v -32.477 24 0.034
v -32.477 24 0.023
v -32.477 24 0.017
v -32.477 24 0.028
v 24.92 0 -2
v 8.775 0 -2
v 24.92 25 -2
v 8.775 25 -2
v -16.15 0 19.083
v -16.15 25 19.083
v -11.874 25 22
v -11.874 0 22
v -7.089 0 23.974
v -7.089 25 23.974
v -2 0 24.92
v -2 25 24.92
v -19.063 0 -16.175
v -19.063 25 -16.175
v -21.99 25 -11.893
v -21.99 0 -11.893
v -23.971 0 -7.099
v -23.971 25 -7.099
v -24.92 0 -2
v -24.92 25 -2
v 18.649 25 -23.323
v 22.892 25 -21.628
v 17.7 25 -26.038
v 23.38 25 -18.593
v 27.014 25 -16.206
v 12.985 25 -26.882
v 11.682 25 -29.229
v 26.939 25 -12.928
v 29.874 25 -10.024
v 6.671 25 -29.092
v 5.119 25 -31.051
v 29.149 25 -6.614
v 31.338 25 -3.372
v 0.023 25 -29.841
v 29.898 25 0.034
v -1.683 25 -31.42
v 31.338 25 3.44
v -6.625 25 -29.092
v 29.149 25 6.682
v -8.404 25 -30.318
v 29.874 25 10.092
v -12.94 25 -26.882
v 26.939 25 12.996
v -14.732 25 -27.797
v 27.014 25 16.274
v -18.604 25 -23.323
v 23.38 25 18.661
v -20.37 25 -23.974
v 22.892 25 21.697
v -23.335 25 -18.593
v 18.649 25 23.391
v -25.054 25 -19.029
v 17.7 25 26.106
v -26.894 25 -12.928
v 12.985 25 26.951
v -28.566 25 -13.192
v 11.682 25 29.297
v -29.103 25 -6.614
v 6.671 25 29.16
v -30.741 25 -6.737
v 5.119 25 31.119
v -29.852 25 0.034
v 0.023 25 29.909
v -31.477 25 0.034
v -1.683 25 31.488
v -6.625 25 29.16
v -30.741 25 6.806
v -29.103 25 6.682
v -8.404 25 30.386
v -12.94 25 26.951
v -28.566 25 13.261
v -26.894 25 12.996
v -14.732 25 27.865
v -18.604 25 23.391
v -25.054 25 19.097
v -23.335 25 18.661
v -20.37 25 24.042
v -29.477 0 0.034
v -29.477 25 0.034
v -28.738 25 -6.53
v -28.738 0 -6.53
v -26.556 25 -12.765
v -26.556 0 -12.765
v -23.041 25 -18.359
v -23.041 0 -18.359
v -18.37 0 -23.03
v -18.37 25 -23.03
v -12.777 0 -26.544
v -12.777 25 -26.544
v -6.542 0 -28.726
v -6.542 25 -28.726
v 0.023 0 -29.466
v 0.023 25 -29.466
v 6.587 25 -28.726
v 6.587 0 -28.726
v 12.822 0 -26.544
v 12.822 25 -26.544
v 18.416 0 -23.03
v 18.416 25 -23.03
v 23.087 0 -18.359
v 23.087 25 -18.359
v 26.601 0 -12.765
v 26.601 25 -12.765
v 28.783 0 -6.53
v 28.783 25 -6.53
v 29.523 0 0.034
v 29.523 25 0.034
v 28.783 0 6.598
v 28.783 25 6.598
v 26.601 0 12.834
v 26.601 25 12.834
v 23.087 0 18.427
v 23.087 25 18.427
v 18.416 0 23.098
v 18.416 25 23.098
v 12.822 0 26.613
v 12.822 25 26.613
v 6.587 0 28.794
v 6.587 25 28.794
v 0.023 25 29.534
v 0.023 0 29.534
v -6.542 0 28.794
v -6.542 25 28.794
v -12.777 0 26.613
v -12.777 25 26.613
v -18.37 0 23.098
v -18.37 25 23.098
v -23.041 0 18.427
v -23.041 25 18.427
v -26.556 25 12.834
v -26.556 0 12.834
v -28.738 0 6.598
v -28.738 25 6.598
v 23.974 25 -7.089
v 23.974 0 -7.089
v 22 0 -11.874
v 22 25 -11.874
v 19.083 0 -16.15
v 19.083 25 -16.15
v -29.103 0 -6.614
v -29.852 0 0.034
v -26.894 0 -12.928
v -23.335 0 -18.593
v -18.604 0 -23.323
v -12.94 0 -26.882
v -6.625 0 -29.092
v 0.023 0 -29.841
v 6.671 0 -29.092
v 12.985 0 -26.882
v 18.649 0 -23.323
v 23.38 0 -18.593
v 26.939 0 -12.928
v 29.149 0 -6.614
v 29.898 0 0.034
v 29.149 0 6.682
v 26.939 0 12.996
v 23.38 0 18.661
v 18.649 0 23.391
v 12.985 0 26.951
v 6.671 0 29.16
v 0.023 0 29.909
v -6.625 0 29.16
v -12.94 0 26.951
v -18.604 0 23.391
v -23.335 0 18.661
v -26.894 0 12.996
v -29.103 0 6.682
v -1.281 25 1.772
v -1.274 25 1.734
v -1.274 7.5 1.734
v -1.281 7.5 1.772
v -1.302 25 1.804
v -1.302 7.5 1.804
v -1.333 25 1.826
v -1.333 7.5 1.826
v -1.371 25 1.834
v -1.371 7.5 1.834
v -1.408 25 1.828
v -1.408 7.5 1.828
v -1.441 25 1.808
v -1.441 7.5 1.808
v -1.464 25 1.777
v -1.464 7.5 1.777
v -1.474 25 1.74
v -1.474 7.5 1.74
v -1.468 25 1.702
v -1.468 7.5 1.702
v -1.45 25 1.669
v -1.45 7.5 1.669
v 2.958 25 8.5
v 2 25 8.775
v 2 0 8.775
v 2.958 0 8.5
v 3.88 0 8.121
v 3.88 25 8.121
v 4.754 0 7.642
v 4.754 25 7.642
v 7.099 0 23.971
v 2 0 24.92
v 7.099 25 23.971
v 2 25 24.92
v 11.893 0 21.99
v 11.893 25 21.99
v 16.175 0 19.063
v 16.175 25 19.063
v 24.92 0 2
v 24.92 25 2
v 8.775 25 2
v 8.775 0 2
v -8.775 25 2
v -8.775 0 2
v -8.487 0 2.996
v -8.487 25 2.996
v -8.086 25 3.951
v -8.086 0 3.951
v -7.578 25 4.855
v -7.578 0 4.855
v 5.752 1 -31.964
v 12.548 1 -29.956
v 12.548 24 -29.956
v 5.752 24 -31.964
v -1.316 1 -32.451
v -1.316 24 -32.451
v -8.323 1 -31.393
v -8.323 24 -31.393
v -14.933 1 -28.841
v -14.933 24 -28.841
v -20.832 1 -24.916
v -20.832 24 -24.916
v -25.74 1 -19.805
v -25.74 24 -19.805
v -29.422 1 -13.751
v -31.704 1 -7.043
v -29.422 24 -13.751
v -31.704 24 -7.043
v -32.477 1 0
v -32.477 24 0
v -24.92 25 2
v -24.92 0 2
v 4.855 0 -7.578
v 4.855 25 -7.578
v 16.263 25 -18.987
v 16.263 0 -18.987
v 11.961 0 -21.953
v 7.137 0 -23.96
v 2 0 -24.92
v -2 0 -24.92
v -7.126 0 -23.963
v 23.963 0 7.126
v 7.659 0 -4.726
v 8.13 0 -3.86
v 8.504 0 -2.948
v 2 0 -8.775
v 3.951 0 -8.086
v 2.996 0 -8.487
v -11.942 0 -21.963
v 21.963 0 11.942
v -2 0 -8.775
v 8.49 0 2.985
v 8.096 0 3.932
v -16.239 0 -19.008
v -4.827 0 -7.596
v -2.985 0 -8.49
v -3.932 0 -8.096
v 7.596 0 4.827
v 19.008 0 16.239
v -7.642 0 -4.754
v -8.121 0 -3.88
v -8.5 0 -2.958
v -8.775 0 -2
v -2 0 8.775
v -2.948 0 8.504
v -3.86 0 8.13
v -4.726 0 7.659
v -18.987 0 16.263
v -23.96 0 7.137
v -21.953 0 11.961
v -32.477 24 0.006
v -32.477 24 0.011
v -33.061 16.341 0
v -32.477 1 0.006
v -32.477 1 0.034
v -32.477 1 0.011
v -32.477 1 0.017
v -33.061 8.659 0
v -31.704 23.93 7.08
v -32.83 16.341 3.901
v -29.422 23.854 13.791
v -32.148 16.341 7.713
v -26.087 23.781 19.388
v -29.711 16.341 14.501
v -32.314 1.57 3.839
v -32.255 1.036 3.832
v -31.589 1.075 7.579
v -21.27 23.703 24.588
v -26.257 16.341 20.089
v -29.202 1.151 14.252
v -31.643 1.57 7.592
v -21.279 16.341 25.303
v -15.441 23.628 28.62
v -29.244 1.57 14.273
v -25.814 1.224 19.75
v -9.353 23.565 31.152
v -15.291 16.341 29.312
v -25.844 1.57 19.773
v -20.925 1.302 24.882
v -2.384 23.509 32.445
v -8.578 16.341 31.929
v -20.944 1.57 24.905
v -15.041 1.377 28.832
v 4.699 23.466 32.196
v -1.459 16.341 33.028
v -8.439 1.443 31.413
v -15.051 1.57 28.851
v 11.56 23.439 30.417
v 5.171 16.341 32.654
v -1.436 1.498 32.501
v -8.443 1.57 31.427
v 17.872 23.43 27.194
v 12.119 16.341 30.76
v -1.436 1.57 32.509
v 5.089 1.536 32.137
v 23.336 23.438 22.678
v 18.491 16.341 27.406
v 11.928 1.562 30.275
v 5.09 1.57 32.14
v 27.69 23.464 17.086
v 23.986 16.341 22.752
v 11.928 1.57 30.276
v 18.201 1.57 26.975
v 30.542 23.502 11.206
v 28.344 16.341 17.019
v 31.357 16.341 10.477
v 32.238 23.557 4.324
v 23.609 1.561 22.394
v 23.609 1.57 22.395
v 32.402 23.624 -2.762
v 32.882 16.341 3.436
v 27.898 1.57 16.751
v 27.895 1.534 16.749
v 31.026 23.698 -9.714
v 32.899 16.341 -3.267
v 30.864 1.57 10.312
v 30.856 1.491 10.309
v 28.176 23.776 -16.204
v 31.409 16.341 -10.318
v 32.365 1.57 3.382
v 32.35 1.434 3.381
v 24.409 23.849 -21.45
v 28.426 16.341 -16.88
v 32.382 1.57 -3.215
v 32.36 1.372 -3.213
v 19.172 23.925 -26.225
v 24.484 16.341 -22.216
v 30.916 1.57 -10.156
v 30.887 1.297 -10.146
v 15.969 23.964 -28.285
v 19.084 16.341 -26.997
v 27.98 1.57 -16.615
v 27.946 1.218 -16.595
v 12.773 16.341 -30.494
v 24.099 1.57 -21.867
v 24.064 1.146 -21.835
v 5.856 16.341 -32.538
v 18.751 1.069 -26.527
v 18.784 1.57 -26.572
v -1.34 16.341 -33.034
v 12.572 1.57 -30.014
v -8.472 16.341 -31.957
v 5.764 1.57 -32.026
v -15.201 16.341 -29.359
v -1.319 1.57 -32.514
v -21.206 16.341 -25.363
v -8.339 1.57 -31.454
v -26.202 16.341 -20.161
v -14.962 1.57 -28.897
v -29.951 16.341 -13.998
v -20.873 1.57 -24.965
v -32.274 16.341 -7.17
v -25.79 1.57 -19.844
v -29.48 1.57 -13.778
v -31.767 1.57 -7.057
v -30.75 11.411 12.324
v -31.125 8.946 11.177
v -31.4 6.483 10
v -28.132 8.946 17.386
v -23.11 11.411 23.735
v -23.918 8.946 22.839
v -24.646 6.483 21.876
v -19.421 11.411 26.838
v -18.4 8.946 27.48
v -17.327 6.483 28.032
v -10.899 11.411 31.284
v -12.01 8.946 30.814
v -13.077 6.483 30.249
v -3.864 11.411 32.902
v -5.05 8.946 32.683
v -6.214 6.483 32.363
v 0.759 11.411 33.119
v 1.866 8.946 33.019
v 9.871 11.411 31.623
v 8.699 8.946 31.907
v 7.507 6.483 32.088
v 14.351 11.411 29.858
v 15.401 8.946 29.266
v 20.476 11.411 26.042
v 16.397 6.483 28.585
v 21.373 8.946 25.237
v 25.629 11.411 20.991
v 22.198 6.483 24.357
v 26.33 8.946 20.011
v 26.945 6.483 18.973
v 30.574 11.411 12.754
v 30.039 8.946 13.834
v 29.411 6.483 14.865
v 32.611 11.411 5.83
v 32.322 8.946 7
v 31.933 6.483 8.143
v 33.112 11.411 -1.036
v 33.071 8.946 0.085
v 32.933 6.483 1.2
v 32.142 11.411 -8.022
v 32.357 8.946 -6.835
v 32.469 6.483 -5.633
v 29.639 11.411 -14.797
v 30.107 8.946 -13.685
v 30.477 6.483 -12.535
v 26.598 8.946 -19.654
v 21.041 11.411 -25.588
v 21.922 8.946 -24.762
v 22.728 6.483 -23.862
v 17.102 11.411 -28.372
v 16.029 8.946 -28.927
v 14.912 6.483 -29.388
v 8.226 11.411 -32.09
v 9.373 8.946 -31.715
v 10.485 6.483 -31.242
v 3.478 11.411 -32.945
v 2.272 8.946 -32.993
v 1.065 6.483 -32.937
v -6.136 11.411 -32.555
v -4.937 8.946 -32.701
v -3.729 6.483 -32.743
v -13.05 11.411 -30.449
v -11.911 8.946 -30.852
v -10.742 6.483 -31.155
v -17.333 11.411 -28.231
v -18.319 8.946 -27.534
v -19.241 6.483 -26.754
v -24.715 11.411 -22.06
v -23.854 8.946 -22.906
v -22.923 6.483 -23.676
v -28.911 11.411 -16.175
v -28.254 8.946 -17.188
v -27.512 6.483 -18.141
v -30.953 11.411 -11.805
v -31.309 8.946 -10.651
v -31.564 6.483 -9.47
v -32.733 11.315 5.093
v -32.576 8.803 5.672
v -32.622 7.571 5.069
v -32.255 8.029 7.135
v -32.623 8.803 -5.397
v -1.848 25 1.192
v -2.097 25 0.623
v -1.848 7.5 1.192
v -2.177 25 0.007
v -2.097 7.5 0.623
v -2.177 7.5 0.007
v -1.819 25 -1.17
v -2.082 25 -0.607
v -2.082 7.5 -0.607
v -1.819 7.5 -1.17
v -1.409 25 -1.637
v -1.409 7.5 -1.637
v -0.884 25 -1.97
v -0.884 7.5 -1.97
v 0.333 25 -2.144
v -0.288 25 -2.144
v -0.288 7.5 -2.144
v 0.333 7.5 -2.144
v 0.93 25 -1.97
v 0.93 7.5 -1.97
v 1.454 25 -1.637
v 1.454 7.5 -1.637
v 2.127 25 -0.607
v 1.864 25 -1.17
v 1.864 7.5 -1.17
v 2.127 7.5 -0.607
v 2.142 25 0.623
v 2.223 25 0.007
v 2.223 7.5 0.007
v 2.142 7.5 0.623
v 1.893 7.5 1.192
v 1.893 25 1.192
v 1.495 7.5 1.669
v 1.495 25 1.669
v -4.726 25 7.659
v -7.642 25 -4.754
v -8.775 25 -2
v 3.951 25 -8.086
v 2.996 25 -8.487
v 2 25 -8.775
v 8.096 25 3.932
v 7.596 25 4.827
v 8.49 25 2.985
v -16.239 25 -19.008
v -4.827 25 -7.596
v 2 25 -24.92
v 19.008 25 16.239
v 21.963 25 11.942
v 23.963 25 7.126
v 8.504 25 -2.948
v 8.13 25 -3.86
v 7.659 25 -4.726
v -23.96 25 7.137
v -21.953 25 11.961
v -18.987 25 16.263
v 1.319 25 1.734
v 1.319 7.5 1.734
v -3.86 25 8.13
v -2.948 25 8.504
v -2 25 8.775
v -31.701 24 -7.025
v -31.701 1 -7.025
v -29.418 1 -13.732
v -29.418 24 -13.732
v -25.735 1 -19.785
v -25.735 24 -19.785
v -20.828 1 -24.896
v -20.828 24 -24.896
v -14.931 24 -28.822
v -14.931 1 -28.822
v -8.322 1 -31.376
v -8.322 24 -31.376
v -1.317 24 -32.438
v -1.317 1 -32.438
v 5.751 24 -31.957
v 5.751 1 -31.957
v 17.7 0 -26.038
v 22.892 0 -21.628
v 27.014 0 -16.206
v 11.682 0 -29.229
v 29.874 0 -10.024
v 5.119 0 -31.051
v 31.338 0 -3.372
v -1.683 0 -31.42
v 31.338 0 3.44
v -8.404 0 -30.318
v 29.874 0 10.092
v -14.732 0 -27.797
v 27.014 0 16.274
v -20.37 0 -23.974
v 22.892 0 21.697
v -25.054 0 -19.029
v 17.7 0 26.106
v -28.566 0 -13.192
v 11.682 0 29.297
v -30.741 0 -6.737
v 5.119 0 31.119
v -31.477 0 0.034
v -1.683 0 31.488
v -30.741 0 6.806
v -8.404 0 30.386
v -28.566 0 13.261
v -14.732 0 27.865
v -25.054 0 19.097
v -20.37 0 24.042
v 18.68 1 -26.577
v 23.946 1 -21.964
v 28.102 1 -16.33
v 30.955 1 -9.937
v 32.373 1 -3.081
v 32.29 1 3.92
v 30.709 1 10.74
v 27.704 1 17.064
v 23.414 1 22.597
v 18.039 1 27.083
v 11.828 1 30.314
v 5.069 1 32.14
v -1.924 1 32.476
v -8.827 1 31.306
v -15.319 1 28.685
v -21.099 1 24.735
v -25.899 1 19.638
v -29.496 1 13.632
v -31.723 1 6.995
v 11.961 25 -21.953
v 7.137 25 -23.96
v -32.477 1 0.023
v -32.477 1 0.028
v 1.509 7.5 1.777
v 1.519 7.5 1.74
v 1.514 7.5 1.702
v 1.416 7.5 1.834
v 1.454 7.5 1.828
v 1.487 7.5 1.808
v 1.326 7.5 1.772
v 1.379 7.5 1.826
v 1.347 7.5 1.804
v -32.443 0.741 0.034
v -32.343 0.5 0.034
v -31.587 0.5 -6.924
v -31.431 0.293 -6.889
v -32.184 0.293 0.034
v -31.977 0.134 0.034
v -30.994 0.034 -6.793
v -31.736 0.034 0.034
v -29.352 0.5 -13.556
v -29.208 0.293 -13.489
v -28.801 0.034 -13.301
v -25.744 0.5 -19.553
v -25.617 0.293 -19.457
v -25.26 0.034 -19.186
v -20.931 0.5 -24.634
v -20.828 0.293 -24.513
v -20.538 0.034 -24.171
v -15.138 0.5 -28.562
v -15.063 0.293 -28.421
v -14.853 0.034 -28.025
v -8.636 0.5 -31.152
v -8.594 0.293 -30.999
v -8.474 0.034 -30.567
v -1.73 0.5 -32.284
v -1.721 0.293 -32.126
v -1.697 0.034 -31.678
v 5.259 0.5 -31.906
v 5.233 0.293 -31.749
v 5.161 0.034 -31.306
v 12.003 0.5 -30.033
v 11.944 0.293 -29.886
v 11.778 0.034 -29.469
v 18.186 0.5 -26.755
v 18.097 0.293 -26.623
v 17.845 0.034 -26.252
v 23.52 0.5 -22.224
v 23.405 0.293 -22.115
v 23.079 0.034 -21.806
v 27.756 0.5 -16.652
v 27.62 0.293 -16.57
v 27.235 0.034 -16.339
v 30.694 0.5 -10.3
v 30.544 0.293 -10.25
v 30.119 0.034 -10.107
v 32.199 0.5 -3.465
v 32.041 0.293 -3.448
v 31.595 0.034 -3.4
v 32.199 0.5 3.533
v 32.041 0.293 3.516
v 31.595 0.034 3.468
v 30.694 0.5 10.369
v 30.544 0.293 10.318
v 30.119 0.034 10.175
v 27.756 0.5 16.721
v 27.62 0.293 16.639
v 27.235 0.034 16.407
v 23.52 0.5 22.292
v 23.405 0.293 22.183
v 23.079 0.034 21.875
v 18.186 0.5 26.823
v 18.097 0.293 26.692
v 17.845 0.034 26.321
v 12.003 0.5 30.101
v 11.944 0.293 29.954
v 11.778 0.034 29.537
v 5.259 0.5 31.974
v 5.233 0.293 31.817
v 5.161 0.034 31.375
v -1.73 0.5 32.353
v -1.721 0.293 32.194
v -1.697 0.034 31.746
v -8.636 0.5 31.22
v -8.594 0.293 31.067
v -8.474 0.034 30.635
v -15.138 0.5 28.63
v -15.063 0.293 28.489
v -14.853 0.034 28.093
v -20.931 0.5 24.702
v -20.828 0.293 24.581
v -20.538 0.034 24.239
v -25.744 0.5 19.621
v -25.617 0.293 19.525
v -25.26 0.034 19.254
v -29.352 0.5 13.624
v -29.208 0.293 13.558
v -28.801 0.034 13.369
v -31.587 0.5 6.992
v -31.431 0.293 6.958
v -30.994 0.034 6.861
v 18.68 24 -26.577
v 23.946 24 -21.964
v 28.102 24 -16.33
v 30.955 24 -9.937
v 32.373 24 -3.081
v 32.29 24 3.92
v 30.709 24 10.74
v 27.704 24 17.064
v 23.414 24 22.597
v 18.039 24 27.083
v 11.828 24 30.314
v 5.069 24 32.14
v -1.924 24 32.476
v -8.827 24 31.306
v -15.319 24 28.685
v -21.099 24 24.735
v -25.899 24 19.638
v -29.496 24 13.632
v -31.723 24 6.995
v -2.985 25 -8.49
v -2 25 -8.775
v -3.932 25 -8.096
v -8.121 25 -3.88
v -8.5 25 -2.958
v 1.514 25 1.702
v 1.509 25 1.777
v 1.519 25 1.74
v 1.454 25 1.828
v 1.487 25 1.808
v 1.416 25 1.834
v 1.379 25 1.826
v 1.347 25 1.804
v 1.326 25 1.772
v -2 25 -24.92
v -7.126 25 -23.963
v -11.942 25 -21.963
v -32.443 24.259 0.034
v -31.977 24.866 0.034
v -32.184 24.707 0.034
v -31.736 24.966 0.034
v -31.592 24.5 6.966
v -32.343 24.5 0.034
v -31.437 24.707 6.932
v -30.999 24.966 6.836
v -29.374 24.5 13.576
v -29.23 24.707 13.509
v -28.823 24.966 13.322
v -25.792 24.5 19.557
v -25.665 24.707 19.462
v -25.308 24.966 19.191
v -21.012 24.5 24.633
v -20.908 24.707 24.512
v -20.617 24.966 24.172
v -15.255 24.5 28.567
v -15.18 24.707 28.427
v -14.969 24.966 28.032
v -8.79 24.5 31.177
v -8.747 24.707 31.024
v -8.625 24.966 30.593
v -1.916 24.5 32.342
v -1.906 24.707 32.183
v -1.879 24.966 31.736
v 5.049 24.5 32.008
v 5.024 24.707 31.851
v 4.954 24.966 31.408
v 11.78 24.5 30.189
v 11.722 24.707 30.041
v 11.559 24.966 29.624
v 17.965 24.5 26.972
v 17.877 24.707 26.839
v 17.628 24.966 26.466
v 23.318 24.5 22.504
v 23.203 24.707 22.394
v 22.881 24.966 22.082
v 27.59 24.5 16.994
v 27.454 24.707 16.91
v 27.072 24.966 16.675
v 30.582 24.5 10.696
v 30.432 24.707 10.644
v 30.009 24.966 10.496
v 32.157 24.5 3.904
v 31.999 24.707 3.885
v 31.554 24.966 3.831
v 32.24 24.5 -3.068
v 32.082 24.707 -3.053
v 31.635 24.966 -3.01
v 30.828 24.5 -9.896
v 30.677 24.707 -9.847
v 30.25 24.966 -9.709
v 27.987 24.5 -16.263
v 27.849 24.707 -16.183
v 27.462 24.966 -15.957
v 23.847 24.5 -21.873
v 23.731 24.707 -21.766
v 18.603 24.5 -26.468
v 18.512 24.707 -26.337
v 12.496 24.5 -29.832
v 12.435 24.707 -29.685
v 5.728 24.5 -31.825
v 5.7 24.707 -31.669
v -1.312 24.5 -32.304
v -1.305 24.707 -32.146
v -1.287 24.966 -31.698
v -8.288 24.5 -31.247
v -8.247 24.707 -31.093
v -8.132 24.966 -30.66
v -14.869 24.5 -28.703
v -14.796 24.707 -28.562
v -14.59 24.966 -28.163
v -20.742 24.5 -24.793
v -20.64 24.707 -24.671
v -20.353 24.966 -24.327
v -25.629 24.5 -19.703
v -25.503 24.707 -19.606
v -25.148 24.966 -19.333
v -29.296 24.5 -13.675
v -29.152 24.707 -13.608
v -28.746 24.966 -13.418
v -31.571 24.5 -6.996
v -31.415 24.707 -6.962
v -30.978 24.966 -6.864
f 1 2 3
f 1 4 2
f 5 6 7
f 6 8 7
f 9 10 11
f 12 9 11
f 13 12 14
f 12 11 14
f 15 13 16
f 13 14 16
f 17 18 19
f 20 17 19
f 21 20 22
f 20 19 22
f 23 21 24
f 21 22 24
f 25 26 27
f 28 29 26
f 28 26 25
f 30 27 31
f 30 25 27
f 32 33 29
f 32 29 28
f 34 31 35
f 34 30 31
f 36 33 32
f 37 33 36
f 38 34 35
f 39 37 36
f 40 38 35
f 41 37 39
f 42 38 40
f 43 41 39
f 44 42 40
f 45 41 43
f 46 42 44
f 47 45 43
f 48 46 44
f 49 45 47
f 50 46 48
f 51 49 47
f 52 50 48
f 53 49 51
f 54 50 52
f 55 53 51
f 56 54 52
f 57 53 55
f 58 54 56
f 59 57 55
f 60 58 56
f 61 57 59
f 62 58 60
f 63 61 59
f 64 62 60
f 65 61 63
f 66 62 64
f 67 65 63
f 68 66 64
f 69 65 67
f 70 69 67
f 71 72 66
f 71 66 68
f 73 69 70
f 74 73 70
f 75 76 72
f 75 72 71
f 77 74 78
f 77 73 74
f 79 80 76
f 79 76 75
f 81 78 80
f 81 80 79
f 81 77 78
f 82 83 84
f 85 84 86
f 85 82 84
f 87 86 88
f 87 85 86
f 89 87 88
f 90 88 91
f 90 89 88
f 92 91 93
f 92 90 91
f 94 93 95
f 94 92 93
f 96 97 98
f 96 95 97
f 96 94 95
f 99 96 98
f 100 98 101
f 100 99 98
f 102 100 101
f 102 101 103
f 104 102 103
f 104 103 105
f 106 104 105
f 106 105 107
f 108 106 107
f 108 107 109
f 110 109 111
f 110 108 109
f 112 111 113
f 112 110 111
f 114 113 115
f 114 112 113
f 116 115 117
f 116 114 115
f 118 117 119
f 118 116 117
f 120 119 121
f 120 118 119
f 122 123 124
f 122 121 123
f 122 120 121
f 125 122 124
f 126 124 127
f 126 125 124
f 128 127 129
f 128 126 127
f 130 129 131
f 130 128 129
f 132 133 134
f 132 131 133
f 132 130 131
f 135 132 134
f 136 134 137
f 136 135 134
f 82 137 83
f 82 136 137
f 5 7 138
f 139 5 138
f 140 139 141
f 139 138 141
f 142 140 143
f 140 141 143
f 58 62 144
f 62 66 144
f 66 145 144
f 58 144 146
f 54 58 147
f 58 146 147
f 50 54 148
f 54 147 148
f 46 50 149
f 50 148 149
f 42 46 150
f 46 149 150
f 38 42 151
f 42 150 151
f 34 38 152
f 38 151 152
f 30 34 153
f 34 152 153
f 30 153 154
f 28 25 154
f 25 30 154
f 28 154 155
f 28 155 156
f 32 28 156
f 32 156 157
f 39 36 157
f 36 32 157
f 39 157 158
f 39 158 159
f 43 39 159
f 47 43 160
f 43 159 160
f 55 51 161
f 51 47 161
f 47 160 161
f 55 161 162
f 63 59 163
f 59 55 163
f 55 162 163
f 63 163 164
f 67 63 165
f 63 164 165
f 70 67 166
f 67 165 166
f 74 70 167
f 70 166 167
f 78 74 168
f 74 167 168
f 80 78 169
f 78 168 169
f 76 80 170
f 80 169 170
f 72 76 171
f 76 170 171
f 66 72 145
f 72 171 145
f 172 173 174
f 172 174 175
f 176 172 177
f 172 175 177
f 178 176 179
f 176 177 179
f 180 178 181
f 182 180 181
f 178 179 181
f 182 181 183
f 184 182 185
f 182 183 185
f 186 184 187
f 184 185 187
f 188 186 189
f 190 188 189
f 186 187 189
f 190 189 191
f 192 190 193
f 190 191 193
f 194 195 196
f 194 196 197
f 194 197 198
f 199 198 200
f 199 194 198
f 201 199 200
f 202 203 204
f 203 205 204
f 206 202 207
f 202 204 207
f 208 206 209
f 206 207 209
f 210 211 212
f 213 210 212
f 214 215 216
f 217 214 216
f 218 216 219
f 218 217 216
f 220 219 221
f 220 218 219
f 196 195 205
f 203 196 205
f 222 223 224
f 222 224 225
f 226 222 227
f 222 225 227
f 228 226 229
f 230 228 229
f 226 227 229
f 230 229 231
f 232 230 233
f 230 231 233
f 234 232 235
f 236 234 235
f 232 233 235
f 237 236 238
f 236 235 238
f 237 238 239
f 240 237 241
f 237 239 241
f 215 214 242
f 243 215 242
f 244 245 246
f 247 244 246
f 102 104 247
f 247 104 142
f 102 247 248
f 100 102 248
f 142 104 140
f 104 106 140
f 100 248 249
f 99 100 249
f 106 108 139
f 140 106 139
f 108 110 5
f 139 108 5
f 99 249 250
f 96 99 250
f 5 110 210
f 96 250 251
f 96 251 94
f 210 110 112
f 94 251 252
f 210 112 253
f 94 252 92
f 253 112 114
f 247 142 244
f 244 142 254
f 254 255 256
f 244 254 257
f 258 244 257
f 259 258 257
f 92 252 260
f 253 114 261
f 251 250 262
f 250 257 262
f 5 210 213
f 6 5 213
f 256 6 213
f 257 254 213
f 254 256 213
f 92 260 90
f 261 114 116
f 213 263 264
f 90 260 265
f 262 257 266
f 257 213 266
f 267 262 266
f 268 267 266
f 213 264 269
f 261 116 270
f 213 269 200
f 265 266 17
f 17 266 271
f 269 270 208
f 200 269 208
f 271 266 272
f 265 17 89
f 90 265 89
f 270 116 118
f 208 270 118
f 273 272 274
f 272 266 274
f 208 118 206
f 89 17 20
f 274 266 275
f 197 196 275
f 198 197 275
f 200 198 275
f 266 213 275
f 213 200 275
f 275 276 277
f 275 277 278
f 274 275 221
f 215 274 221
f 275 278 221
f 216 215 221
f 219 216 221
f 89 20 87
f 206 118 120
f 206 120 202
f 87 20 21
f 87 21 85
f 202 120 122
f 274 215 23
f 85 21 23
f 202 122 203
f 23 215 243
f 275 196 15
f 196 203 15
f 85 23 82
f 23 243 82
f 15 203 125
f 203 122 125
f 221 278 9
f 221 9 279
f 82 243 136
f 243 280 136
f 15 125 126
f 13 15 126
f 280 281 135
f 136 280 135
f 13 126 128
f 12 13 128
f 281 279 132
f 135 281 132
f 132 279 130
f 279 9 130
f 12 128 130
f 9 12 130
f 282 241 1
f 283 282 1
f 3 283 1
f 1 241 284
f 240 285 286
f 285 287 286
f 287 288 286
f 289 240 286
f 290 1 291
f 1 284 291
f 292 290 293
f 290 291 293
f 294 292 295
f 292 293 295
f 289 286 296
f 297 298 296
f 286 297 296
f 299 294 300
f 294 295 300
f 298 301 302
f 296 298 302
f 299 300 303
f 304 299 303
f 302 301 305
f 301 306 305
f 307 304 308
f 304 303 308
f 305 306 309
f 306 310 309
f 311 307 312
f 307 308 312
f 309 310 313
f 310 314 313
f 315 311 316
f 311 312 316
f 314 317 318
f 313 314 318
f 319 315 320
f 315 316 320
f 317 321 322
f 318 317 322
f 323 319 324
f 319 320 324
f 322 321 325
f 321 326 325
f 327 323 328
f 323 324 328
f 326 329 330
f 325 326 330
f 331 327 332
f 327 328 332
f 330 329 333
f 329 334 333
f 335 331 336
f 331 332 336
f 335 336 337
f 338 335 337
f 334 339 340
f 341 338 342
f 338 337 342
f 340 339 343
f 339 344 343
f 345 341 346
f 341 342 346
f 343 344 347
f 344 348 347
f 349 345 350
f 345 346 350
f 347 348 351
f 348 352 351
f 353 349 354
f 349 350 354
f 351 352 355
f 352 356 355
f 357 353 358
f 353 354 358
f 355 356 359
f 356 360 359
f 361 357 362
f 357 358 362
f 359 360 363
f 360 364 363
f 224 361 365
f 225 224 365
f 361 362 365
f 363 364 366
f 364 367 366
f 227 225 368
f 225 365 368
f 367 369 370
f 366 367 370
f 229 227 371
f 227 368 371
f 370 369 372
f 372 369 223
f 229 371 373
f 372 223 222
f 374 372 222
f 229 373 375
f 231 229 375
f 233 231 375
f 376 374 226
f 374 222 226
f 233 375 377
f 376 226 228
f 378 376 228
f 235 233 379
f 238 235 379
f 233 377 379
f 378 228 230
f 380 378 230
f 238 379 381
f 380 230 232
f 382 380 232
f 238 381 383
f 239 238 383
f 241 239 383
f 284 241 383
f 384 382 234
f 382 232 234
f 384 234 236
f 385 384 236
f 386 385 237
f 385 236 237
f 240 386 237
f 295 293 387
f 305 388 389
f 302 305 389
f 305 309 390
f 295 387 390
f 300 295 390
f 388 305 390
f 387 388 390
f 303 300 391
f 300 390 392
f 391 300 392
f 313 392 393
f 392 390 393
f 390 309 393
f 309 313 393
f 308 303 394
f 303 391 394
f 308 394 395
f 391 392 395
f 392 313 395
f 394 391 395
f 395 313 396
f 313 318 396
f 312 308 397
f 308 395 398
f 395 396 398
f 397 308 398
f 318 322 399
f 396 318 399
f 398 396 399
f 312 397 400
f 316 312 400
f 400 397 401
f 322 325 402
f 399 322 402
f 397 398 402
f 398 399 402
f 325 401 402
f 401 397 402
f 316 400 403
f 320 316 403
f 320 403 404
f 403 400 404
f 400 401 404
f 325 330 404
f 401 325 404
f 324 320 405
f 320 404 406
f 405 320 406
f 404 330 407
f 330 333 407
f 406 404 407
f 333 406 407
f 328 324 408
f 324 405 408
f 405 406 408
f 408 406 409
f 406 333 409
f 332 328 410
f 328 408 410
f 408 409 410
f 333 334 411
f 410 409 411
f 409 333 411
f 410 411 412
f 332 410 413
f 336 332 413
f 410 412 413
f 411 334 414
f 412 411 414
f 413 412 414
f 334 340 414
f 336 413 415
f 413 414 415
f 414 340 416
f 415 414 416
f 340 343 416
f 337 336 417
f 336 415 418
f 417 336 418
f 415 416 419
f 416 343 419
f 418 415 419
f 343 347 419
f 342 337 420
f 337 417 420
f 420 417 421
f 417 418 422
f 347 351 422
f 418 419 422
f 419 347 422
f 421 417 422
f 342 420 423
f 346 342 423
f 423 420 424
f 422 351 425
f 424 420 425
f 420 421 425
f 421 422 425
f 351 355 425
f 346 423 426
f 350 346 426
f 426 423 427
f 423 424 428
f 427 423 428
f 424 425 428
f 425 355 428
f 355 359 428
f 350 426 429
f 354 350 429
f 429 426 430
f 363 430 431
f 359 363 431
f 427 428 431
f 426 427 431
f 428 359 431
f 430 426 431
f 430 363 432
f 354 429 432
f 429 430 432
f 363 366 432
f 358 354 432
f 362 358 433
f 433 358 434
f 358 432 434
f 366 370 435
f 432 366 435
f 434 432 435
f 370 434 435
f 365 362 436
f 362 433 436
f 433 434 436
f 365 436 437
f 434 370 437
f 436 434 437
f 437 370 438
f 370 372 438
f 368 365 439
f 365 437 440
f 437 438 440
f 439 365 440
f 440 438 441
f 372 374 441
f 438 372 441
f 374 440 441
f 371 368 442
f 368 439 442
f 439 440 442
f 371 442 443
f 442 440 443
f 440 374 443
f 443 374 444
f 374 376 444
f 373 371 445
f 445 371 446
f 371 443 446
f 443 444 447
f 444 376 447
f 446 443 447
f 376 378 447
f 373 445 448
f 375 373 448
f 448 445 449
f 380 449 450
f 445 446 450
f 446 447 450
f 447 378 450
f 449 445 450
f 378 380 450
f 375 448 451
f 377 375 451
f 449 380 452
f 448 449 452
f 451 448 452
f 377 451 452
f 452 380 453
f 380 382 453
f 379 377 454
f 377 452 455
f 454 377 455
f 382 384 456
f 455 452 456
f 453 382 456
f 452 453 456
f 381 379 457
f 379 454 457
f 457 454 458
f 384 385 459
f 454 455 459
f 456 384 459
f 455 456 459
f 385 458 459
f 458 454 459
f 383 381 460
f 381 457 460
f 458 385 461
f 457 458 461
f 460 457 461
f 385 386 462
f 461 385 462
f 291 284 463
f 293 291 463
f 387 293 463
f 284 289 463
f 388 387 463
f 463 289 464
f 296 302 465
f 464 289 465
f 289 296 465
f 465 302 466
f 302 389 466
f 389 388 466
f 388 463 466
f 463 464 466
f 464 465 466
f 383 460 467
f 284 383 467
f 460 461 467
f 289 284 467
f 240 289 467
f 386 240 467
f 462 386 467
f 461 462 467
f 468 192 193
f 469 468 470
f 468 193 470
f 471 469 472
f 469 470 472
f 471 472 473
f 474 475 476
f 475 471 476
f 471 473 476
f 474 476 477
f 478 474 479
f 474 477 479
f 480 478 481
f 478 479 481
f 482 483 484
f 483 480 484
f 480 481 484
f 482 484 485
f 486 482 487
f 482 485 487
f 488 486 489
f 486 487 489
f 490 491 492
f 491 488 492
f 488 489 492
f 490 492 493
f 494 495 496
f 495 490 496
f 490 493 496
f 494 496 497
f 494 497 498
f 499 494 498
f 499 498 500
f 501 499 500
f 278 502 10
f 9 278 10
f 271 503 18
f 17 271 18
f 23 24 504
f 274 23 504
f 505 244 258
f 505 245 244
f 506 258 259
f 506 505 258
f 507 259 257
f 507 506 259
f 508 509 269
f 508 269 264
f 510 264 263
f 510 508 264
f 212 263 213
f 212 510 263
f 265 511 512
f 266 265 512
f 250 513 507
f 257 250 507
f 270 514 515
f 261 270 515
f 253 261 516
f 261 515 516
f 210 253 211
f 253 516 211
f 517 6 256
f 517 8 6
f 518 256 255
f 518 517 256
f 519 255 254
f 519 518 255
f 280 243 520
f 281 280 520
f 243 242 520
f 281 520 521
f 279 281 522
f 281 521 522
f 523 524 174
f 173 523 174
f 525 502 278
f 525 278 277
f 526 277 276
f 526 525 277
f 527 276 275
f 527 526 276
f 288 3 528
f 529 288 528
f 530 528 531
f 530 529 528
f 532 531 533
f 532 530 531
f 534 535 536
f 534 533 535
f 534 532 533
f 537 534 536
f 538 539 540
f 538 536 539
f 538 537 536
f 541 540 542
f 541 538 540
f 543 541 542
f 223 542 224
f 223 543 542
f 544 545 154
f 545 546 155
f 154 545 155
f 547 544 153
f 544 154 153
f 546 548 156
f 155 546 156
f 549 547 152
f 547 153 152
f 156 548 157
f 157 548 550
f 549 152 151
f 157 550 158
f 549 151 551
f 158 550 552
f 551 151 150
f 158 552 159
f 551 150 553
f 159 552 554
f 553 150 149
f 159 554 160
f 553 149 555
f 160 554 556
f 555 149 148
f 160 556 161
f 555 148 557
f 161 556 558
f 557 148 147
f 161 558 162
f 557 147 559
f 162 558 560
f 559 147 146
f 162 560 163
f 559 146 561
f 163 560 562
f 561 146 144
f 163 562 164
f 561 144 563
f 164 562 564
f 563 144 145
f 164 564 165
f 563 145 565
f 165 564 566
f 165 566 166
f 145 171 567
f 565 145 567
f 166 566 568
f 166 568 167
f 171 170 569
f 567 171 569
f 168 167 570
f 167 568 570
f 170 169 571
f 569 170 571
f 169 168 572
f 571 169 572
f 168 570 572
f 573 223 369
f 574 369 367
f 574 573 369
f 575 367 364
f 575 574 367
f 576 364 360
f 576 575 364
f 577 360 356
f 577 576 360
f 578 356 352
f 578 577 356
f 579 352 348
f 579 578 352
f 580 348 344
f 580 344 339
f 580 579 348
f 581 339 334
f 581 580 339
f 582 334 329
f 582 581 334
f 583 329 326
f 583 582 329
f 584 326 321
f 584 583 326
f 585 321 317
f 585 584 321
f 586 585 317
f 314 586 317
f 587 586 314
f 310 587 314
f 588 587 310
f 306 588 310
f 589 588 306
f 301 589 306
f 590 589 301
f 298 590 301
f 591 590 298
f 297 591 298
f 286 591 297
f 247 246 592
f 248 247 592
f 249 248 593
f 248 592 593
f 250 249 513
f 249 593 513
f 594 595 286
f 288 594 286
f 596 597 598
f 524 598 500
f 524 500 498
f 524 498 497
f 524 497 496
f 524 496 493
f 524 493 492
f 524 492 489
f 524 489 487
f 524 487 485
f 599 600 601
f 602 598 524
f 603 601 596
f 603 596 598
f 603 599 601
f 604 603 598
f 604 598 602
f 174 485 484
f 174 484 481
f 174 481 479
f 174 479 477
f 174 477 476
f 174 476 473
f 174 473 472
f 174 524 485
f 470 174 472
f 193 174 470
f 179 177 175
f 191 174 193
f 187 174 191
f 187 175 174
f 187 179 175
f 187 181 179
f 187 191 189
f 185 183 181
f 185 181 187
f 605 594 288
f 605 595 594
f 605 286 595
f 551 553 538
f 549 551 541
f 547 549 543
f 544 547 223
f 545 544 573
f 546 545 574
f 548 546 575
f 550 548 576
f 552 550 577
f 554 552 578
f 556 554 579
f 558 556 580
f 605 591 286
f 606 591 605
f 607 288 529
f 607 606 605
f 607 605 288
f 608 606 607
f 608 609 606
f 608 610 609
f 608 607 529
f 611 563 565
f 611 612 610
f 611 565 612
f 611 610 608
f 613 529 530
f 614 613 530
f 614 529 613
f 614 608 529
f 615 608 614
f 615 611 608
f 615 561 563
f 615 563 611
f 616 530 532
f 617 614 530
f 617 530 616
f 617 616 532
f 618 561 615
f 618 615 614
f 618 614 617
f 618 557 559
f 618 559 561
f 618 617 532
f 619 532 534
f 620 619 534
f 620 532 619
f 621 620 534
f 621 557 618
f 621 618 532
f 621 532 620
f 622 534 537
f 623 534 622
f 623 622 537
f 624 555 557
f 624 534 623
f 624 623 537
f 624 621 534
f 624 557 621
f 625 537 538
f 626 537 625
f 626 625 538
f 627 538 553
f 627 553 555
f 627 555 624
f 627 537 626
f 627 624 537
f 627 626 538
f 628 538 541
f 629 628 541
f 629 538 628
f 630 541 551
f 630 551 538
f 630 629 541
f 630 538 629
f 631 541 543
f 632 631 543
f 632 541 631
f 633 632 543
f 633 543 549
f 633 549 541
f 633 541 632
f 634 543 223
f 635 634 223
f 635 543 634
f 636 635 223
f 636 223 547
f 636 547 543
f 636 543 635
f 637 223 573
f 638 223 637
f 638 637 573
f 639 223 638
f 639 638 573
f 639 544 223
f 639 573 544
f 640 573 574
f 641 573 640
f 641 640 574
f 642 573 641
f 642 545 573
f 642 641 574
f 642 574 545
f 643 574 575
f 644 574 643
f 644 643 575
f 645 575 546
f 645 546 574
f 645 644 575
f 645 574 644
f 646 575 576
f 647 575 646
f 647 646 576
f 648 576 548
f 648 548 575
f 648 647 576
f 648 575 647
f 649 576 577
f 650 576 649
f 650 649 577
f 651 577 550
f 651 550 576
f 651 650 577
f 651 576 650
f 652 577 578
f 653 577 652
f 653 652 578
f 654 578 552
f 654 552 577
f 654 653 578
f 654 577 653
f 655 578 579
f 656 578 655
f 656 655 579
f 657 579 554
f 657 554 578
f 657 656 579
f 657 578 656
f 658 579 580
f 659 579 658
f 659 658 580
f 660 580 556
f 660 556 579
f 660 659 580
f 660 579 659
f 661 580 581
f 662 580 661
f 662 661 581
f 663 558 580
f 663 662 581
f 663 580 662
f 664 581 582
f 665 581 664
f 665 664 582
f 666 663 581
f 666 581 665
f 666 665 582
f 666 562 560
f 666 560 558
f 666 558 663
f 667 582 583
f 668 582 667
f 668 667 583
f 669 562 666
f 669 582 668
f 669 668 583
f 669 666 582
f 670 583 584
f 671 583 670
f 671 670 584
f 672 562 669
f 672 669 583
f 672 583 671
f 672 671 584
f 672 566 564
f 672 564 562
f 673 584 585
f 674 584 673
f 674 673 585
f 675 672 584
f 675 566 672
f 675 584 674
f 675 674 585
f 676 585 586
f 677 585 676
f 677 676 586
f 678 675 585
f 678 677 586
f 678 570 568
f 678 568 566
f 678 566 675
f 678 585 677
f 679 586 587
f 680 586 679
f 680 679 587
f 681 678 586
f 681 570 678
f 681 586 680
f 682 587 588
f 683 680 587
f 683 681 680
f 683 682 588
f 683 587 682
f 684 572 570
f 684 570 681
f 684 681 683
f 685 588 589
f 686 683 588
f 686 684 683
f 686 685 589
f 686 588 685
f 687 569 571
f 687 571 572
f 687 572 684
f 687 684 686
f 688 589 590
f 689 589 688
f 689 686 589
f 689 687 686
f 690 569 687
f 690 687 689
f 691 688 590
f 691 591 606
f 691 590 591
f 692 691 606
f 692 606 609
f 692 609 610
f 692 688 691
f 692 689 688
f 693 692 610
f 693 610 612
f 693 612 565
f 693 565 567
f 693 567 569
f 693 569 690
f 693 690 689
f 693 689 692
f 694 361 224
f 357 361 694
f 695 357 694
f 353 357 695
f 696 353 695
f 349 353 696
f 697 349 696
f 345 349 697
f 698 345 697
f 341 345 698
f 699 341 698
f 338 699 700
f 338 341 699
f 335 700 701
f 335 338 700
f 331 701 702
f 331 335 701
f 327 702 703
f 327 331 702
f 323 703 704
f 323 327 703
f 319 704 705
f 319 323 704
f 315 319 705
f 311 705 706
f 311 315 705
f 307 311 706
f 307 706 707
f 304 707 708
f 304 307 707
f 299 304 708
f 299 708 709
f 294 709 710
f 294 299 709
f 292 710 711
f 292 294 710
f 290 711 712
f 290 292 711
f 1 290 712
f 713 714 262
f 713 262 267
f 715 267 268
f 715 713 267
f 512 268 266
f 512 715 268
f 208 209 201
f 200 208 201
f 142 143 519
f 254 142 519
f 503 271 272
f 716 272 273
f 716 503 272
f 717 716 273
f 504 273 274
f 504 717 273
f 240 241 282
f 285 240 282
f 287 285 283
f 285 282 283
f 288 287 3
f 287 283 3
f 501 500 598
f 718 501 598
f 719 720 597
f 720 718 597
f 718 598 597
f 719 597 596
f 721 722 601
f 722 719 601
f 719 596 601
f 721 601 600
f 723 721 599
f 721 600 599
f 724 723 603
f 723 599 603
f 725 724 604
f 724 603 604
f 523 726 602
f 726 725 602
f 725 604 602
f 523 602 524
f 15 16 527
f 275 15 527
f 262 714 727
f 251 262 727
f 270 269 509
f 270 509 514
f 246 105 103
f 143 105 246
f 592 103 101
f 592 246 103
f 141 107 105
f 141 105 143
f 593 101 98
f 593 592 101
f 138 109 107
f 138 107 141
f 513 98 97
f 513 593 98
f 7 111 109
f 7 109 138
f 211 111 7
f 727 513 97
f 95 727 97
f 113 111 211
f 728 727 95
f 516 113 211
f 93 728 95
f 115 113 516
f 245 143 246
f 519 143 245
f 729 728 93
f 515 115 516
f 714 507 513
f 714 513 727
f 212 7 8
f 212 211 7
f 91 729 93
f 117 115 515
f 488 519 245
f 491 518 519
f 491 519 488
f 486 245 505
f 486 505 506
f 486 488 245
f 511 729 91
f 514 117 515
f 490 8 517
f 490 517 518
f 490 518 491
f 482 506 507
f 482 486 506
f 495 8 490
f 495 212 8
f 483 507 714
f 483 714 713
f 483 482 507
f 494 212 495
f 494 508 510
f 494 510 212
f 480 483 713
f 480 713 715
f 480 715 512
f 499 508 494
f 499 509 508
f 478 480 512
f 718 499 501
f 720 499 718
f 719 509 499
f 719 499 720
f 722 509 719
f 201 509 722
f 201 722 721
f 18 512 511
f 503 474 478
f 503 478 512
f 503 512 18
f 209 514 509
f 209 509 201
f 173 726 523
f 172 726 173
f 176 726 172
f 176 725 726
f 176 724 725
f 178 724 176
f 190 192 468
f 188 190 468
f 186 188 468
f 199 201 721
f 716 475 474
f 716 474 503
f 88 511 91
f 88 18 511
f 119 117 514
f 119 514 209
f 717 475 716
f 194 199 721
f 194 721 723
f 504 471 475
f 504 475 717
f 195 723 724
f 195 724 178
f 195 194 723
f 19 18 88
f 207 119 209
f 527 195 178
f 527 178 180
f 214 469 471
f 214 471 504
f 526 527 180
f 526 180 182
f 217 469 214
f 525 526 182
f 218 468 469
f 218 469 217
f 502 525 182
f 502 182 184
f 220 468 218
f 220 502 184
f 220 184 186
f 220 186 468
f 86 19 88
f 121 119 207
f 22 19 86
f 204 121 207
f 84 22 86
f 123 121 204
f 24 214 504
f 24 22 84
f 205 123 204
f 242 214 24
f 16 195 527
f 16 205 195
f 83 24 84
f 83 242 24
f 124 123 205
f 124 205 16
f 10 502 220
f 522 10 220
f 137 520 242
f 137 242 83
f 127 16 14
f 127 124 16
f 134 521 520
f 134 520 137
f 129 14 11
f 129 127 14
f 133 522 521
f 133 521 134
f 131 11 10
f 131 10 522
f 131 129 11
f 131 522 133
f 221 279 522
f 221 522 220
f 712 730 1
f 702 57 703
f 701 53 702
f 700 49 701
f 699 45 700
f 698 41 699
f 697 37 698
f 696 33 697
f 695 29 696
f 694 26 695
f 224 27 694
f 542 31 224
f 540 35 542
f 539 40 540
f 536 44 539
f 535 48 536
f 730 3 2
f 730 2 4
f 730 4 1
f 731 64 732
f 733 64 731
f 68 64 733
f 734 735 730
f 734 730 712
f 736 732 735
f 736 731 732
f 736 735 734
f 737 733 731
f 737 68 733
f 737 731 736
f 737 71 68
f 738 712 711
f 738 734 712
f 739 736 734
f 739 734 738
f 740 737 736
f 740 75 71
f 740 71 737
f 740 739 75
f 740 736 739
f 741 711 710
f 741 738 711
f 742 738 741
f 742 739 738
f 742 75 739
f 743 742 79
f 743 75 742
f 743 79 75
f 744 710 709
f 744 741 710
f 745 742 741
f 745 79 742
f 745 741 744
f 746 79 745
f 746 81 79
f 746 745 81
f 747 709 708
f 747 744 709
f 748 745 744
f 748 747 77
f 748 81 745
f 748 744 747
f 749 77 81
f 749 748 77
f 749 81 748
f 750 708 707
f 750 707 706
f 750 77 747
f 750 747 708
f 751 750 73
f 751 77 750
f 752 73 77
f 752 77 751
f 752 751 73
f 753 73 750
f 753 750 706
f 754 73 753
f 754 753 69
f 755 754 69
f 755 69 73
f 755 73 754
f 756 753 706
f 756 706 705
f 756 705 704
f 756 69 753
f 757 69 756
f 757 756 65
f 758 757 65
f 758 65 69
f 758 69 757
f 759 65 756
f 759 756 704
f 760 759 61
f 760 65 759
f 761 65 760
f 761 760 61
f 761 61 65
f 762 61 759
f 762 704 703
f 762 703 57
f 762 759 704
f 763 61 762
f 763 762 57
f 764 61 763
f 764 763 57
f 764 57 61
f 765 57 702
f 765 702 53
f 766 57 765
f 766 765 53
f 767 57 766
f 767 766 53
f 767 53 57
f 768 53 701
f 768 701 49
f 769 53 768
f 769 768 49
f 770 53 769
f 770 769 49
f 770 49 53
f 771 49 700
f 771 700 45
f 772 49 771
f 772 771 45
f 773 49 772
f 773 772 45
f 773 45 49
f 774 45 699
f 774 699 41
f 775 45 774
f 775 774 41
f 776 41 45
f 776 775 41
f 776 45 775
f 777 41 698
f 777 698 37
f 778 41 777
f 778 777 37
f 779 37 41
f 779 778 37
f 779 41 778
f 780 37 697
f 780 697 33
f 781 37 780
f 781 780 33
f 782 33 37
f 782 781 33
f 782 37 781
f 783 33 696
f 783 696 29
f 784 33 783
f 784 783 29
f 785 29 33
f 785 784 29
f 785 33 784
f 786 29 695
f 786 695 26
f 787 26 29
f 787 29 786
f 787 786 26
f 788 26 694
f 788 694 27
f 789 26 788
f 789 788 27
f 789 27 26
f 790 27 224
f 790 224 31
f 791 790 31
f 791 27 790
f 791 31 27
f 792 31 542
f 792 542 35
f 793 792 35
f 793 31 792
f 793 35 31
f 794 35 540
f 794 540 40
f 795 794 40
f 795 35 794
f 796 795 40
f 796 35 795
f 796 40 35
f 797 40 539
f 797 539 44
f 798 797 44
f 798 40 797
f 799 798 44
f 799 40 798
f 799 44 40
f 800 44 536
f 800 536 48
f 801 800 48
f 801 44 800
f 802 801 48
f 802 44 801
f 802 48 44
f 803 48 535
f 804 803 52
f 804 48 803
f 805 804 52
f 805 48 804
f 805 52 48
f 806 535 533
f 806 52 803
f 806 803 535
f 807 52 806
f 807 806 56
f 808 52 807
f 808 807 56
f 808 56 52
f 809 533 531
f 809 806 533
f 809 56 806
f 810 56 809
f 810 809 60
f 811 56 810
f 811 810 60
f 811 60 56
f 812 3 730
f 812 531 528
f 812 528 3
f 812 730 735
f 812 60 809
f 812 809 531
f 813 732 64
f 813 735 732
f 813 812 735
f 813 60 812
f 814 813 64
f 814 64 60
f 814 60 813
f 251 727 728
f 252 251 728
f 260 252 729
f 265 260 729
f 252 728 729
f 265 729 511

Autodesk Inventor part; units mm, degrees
ref_plane "YZ Plane" through (0, 0, 0) normal (1, 0, 0) x (0, 1, 0)
ref_plane "XZ Plane" through (0, 0, 0) normal (0, 1, 0) x (-1, 0, 0)
sketch "Sketch1" plane through (0, 0, 0) normal (0, 1, 0) x (-1, 0, 0)
  circle A0 centre (-0.0227, 0.0341) radius 32.5
  arc A1 (-1.3456, 1.5341) -> (1.3002, 1.5341) centre (-0.0227, 0.0341) ccw
  line L0 (1.3002, 1.5341) -> (-1.3456, 1.5341)
  arc A2 (-1.4191, 1.7341) -> (1.3737, 1.7341) centre (-0.0227, 0.0341) ccw
  line L1 (-1.4191, 1.7341) -> (1.3737, 1.7341)
  circle A3 centre (-0.0227, 0.0341) radius 29.5
  circle A4 centre (-0.0227, 0.0341) radius 29.875
  circle A5 centre (1.3737, 1.7341) radius 0.1
  circle A6 centre (-1.4191, 1.7341) radius 0.1
  point P0 (0, 0)
  point P1 (-1.4949, 1.6688)
  point P2 (-1.3191, 1.7341)
  point P3 (1.2737, 1.7341)
  point P4 (1.4495, 1.6688)
  dimension "d0" = 65
  dimension "d1" = 0.2
  dimension "d2" = 59
  dimension "d3" = 59.75
  dimension "d9" = 0.2
  dimension "d10" = 0.2
extrude "Extrusion1" add sketch "Sketch1" along normal blind 25 contours A3
extrude "Extrusion2" add sketch "Sketch1" along normal blind 25 separate body contours A0
fillet "Fillet1" radius 1 2 edges at (32.5227, 25, 0.0341) (32.5227, 0, 0.0341)
sketch "Sketch2" plane through (0.0227, 25, 0.0341) normal (0, 1, 0) x (1, 0, 0)
  circle A0 centre (-0.0227, 0.0341) radius 9
  circle A1 centre (-0.0227, 0.0341) radius 25
  line L0 (-18.0392, 20.8195) -> (20.8516, -18.0714)
  line L1 (20.8516, -18.0714) -> (18.0232, -20.8998)
  line L2 (18.0232, -20.8998) -> (-20.8677, 17.9911)
  line L3 (-20.8677, 17.9911) -> (-18.0392, 20.8195)
  line L4 (27.4773, -1.9659) -> (-27.5227, 2.0341) construction
  line L5 (-27.5227, -1.9659) -> (27.4773, 2.0341) construction
  line L6 (1.9773, -27.4659) -> (-2.0227, -27.4659)
  line L7 (-2.0227, -27.4659) -> (-2.0227, 27.5341)
  line L8 (-2.0227, 27.5341) -> (1.9773, 27.5341)
  line L9 (1.9773, 27.5341) -> (1.9773, -27.4659)
  line L10 (1.9773, -27.4659) -> (-2.0227, 27.5341) construction
  line L11 (-2.0227, -27.4659) -> (1.9773, 27.5341) construction
  line L12 (27.4773, -1.9659) -> (-27.5227, -1.9659)
  line L13 (-27.5227, -1.9659) -> (-27.5227, 2.0341)
  line L14 (-27.5227, 2.0341) -> (27.4773, 2.0341)
  line L15 (27.4773, 2.0341) -> (27.4773, -1.9659)
  line L16 (27.4773, -1.9659) -> (-27.5227, 2.0341) construction
  line L17 (-27.5227, -1.9659) -> (27.4773, 2.0341) construction
  line L18 (-20.8195, -18.0392) -> (18.0714, 20.8516)
  line L19 (18.0714, 20.8516) -> (20.8998, 18.0232)
  line L20 (20.8998, 18.0232) -> (-17.9911, -20.8677)
  line L21 (-17.9911, -20.8677) -> (-20.8195, -18.0392)
  point P0 (1.9773, -8.7409)
  point P1 (1.9773, -24.8858)
  point P2 (16.1519, -19.0285)
  point P3 (4.7313, -7.6079)
  point P4 (24.8972, -1.9659)
  point P5 (8.7523, -1.9659)
  point P6 (7.5733, -4.793)
  point P7 (18.9851, -16.2049)
  point P8 (19.0607, 16.1841)
  point P9 (7.6366, 4.76)
  point P10 (8.7523, 2.0341)
  point P11 (24.8972, 2.0341)
  point P12 (4.8321, 7.6124)
  point P13 (16.2407, 19.021)
  point P14 (1.9773, 24.9539)
  point P15 (1.9773, 8.809)
  point P16 (-2.0227, 8.809)
  point P17 (-2.0227, 24.9539)
  point P18 (-16.2616, 19.0419)
  point P19 (-4.8498, 7.6301)
  point P20 (-24.9426, 2.0341)
  point P21 (-8.7977, 2.0341)
  point P22 (-7.6647, 4.7881)
  point P23 (-19.0853, 16.2087)
  point P24 (-19.0096, -16.2293)
  point P25 (-7.601, -4.8208)
  point P26 (-8.7977, -1.9659)
  point P27 (-24.9426, -1.9659)
  point P28 (-4.7487, -7.6253)
  point P29 (-16.1728, -19.0493)
  point P30 (-2.0227, -24.8858)
  point P31 (-2.0227, -8.7409)
  dimension "d11" = 18
  dimension "d12" = 50
  dimension "d13" = 55
  dimension "d14" = 4
  dimension "d15" = 4
  dimension "d16" = 55
extrude "Extrusion3" cut sketch "Sketch2" against normal blind 25 contours A0 L20 A1 L14 | L12 A1 L0 A0 | A0 L9 A1 L18 | L2 A1 L9 A0 | A0 L0 A1 L7 | L7 A1 L20 A0 | A0 L14 A1 L2 | L18 A1 L12 A0 bodies 1
ref_plane "Work Plane1" through (-24.9199, 25, 0) normal (0, 0, 1) x (1, 0, 0)
sketch "Sketch3" plane through (-24.9199, 25, 0) normal (0, 0, 1) x (1, 0, 0)
  line L0 (-7.5574, -24) -> (-7.5574, -1) projected
  line L1 (57.4426, -24) -> (57.4426, -1) projected
  line L2 (57.4426, -1) -> (-7.5574, -1)
  line L3 (-7.5574, -1) -> (-7.5574, -24)
  line L4 (-7.5574, -24) -> (57.4426, -24)
  line L5 (57.4426, -24) -> (57.4426, -1)
  arc A0 (-7.5574, -1) -> (-7.5574, -24) centre (92.85, -12.5) ccw
  line L6 (-7.5574, -1) -> (57.4426, -24) construction
  line L7 (-7.5574, -24) -> (57.4426, -1) construction
  line L8 (26.4148, -25) -> (26.4148, 0) construction
  line L9 (26.4148, -13.0209) -> (26.4148, -1) construction
  line L10 (26.4148, -13.0209) -> (26.4148, -24) construction
  line L11 (24.9199, -30) -> (24.9199, 5) projected
  point P0 (24.9199, -25)
revolve "Revolution1" add sketch "Sketch3" angle 360 about axis through (0, -10, 0) along (0, 1, 0) separate body contours A0 L0
extrude "Extrusion4" add sketch "Sketch1" along normal blind 7.5 contours L0 A1 | L1 A6 A2 | A2 A6 L1 | A6 L1 A5 A2 | A5 L1 A2 | A2 L1 A5 bodies 1
combine bodies "Combine1" operation type add bodies to combine 3 2
properties part number "wheel"
